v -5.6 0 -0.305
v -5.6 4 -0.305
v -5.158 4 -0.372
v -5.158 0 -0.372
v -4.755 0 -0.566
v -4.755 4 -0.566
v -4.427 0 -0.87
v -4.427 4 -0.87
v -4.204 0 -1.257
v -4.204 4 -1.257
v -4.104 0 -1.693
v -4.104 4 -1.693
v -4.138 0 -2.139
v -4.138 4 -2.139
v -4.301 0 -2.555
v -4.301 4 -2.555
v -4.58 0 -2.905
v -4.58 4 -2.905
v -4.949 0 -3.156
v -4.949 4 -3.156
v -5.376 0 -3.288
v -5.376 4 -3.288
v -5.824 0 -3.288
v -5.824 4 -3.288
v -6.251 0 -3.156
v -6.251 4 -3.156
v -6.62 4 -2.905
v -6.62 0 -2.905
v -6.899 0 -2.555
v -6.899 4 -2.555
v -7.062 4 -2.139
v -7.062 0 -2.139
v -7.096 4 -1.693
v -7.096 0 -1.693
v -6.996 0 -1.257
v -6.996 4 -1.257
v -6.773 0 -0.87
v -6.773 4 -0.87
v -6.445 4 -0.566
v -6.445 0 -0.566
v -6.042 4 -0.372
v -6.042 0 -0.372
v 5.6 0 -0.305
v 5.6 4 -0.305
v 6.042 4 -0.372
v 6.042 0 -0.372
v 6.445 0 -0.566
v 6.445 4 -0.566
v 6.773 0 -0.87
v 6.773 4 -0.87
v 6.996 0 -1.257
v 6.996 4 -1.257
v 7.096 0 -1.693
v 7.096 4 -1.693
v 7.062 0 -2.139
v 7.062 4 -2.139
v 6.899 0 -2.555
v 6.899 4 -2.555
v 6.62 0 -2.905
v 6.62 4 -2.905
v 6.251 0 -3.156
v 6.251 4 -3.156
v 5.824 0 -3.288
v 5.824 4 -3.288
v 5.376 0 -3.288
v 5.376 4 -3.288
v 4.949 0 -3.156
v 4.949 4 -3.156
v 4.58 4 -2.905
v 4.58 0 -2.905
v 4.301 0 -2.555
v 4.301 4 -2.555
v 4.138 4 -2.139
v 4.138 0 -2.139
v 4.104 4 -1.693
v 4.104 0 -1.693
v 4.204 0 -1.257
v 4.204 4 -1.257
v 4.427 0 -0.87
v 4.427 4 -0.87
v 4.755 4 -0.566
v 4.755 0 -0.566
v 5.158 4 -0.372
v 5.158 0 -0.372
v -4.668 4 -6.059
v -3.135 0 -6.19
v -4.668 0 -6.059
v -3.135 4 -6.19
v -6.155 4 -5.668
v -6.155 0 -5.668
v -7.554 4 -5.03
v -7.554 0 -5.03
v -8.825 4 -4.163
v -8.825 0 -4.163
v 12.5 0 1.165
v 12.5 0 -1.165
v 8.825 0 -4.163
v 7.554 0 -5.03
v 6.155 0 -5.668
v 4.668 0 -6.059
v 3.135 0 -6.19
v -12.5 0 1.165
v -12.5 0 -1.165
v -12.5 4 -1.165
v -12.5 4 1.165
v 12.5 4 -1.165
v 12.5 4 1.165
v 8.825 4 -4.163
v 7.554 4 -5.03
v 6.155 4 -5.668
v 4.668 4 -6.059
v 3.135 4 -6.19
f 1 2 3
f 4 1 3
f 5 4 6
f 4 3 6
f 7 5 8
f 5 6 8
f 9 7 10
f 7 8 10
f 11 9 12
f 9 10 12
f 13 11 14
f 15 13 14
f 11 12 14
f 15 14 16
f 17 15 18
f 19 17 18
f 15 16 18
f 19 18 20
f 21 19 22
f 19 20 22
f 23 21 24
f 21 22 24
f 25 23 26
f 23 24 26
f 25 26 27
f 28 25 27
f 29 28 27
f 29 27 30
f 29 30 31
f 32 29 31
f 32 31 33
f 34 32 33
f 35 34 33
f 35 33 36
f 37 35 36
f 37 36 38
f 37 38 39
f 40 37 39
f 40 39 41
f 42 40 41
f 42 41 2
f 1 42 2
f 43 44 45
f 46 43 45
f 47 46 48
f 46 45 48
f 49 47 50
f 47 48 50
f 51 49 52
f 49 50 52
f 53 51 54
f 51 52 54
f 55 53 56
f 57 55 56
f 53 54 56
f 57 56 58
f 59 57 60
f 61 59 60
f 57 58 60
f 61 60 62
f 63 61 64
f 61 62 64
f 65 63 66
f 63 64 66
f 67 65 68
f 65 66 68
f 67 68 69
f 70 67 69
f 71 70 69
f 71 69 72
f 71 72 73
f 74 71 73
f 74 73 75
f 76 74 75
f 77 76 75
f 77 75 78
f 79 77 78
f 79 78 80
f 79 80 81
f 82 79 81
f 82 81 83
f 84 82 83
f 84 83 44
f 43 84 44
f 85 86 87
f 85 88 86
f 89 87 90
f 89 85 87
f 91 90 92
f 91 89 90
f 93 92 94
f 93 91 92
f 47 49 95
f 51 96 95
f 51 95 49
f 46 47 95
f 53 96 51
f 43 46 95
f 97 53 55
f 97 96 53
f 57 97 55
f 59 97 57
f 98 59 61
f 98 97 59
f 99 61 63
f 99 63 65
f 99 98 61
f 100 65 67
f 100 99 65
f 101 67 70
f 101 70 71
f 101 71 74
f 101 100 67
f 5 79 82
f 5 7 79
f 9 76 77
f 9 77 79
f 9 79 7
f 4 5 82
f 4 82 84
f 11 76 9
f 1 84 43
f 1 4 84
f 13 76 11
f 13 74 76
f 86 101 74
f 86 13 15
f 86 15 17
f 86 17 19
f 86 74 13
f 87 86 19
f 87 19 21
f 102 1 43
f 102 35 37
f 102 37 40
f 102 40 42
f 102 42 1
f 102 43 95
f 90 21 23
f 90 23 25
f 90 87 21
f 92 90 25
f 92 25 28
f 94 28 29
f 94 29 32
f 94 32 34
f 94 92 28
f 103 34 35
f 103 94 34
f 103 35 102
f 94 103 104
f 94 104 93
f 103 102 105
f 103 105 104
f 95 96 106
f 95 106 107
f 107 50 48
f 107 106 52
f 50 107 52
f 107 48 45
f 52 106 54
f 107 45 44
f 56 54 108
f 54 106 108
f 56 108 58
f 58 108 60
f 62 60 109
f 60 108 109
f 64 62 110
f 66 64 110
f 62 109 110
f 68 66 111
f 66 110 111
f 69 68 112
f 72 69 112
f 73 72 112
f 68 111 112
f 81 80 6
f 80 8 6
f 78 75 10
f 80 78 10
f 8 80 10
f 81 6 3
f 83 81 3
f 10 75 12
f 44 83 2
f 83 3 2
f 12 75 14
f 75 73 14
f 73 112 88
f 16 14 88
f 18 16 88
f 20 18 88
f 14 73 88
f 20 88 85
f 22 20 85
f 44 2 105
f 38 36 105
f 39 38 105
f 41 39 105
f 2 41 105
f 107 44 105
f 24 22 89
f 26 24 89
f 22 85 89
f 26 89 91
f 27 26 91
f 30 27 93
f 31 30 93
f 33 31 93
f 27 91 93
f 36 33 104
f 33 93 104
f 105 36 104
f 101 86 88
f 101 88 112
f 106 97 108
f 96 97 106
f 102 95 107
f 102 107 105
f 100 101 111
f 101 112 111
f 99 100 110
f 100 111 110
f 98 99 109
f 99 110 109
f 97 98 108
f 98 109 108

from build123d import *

# Parameters (mm, degrees)
SALIENTE_EXTRUIR1_DEPTH = 4
REDONDEO1_R             = 9
CROQUIS2_R              = 1.5
CORTAR_EXTRUIR1_DEPTH   = 15.510883067


with BuildPart() as part:
    # Croquis1 → Saliente-Extruir1 (new body)
    with BuildSketch(Plane(origin=(0, 0, 0), x_dir=(1, 0, 0), z_dir=(0, 1, 0))):
        Polygon((-6.340973223, 6.189969903), (6.340973223, 6.189969903), (12.5, 1.165), (12.5, -1.165), (-12.5, -1.165), (-12.5, 1.165), align=None)
    extrude(amount=SALIENTE_EXTRUIR1_DEPTH)

    # Redondeo1
    redondeo1_edges = [part.edges().sort_by_distance(p)[0] for p in [
        (-6.340973223, 2, -6.189969903),
        (6.340973223, 2, -6.189969903),
    ]]
    fillet(redondeo1_edges, radius=REDONDEO1_R)

    # Croquis2 → Cortar-Extruir1 (cut, through all)
    with BuildSketch(Plane(origin=(0, 4, 0), x_dir=(1, 0, 0), z_dir=(0, 1, 0))):
        with Locations(Location((-5.6, 1.805, 0), (0, 0, 270))):
            Circle(CROQUIS2_R)
        with Locations(Location((5.6, 1.805, 0), (0, 0, 270))):
            Circle(CROQUIS2_R)
    extrude(amount=-CORTAR_EXTRUIR1_DEPTH, mode=Mode.SUBTRACT)


solid = part.part
